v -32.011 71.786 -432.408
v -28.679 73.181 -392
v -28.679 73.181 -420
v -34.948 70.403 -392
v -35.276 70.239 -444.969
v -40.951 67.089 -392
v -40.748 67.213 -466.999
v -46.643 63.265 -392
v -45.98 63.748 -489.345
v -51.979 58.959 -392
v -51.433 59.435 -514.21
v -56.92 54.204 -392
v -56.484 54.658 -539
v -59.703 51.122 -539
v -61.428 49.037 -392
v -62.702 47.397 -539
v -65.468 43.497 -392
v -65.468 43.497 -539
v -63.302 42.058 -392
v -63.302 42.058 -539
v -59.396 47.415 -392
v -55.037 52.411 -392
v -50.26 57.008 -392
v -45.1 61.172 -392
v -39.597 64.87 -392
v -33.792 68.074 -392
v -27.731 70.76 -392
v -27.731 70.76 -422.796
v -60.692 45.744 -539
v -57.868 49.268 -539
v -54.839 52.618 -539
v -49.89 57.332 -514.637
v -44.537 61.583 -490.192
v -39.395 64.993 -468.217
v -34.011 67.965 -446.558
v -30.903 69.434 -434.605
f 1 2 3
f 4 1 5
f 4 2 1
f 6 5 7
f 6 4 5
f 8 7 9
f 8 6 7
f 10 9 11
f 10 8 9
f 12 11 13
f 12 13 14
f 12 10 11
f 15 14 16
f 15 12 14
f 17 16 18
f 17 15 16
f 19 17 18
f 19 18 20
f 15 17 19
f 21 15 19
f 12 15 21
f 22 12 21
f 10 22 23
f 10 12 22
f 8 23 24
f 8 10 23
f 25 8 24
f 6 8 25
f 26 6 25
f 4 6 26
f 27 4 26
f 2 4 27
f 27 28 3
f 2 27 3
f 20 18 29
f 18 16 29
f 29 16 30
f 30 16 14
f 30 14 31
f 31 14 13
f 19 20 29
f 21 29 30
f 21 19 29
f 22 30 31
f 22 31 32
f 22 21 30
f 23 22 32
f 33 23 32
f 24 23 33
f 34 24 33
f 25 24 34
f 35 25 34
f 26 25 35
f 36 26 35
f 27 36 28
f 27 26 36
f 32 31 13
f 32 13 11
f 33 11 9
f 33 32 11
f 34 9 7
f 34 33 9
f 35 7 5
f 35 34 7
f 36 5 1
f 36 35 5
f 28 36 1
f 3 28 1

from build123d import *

# Parameters (mm, degrees)
BOSS_EXTRUDE1_START     = -392
BOSS_EXTRUDE1_DEPTH     = 147
CUT_EXTRUDE1_DEPTH      = 148
SKETCH3_OUTSIDE_W       = 81.897
SKETCH3_OUTSIDE_H       = 179.984
CUT_EXTRUDE2_DEPTH      = 26.581353828
CUT_EXTRUDE2_DEPTH_BACK = 23.337511723


with BuildPart() as part:
    # Sketch1 → Boss-Extrude1 (new body)
    with BuildSketch(Plane.XY.offset(BOSS_EXTRUDE1_START)):
        with BuildLine():
            Line((0, 76), (0, 78.6))
            ThreePointArc((0, 78.6), (-78.6, 0), (0, -78.6))
            Line((0, -78.6), (0, -76))
            ThreePointArc((0, -76), (-76, 0), (0, 76))
        make_face()
    extrude(amount=-BOSS_EXTRUDE1_DEPTH)

    # Sketch2 → Cut-Extrude1 (cut, through all)
    with BuildSketch(Plane.XY.offset(-392)):
        with BuildLine():
            Line((0, 0), (-28.679315249, 73.180987127))
            ThreePointArc((-28.679315249, 73.180987127), (49.357896331, -61.169911474), (-65.46760952, 43.496575771))
            Line((-65.46760952, 43.496575771), (0, 0))
        make_face()
    extrude(amount=-CUT_EXTRUDE1_DEPTH, mode=Mode.SUBTRACT)

    # Sketch3 outside → Cut-Extrude2 (cut, two sides)
    with BuildSketch(Plane(origin=(-45.516324952, 56.408999874, 0), x_dir=(0.778243149, 0.627963058, 0), z_dir=(-0.627963058, 0.778243149, 0))) as cut_extrude2_sk:
        with Locations((-0.0825, 465.5)):
            Rectangle(SKETCH3_OUTSIDE_W, SKETCH3_OUTSIDE_H)
        Polygon((23.635475841, 392), (-97.818058366, 392), (-57.320280341, 551.13514832), (-9.635475841, 539), (23.635475841, 420), align=None, mode=Mode.SUBTRACT)
    extrude(amount=CUT_EXTRUDE2_DEPTH, mode=Mode.SUBTRACT)
    extrude(cut_extrude2_sk.sketch, amount=-CUT_EXTRUDE2_DEPTH_BACK, mode=Mode.SUBTRACT)


solid = part.part
